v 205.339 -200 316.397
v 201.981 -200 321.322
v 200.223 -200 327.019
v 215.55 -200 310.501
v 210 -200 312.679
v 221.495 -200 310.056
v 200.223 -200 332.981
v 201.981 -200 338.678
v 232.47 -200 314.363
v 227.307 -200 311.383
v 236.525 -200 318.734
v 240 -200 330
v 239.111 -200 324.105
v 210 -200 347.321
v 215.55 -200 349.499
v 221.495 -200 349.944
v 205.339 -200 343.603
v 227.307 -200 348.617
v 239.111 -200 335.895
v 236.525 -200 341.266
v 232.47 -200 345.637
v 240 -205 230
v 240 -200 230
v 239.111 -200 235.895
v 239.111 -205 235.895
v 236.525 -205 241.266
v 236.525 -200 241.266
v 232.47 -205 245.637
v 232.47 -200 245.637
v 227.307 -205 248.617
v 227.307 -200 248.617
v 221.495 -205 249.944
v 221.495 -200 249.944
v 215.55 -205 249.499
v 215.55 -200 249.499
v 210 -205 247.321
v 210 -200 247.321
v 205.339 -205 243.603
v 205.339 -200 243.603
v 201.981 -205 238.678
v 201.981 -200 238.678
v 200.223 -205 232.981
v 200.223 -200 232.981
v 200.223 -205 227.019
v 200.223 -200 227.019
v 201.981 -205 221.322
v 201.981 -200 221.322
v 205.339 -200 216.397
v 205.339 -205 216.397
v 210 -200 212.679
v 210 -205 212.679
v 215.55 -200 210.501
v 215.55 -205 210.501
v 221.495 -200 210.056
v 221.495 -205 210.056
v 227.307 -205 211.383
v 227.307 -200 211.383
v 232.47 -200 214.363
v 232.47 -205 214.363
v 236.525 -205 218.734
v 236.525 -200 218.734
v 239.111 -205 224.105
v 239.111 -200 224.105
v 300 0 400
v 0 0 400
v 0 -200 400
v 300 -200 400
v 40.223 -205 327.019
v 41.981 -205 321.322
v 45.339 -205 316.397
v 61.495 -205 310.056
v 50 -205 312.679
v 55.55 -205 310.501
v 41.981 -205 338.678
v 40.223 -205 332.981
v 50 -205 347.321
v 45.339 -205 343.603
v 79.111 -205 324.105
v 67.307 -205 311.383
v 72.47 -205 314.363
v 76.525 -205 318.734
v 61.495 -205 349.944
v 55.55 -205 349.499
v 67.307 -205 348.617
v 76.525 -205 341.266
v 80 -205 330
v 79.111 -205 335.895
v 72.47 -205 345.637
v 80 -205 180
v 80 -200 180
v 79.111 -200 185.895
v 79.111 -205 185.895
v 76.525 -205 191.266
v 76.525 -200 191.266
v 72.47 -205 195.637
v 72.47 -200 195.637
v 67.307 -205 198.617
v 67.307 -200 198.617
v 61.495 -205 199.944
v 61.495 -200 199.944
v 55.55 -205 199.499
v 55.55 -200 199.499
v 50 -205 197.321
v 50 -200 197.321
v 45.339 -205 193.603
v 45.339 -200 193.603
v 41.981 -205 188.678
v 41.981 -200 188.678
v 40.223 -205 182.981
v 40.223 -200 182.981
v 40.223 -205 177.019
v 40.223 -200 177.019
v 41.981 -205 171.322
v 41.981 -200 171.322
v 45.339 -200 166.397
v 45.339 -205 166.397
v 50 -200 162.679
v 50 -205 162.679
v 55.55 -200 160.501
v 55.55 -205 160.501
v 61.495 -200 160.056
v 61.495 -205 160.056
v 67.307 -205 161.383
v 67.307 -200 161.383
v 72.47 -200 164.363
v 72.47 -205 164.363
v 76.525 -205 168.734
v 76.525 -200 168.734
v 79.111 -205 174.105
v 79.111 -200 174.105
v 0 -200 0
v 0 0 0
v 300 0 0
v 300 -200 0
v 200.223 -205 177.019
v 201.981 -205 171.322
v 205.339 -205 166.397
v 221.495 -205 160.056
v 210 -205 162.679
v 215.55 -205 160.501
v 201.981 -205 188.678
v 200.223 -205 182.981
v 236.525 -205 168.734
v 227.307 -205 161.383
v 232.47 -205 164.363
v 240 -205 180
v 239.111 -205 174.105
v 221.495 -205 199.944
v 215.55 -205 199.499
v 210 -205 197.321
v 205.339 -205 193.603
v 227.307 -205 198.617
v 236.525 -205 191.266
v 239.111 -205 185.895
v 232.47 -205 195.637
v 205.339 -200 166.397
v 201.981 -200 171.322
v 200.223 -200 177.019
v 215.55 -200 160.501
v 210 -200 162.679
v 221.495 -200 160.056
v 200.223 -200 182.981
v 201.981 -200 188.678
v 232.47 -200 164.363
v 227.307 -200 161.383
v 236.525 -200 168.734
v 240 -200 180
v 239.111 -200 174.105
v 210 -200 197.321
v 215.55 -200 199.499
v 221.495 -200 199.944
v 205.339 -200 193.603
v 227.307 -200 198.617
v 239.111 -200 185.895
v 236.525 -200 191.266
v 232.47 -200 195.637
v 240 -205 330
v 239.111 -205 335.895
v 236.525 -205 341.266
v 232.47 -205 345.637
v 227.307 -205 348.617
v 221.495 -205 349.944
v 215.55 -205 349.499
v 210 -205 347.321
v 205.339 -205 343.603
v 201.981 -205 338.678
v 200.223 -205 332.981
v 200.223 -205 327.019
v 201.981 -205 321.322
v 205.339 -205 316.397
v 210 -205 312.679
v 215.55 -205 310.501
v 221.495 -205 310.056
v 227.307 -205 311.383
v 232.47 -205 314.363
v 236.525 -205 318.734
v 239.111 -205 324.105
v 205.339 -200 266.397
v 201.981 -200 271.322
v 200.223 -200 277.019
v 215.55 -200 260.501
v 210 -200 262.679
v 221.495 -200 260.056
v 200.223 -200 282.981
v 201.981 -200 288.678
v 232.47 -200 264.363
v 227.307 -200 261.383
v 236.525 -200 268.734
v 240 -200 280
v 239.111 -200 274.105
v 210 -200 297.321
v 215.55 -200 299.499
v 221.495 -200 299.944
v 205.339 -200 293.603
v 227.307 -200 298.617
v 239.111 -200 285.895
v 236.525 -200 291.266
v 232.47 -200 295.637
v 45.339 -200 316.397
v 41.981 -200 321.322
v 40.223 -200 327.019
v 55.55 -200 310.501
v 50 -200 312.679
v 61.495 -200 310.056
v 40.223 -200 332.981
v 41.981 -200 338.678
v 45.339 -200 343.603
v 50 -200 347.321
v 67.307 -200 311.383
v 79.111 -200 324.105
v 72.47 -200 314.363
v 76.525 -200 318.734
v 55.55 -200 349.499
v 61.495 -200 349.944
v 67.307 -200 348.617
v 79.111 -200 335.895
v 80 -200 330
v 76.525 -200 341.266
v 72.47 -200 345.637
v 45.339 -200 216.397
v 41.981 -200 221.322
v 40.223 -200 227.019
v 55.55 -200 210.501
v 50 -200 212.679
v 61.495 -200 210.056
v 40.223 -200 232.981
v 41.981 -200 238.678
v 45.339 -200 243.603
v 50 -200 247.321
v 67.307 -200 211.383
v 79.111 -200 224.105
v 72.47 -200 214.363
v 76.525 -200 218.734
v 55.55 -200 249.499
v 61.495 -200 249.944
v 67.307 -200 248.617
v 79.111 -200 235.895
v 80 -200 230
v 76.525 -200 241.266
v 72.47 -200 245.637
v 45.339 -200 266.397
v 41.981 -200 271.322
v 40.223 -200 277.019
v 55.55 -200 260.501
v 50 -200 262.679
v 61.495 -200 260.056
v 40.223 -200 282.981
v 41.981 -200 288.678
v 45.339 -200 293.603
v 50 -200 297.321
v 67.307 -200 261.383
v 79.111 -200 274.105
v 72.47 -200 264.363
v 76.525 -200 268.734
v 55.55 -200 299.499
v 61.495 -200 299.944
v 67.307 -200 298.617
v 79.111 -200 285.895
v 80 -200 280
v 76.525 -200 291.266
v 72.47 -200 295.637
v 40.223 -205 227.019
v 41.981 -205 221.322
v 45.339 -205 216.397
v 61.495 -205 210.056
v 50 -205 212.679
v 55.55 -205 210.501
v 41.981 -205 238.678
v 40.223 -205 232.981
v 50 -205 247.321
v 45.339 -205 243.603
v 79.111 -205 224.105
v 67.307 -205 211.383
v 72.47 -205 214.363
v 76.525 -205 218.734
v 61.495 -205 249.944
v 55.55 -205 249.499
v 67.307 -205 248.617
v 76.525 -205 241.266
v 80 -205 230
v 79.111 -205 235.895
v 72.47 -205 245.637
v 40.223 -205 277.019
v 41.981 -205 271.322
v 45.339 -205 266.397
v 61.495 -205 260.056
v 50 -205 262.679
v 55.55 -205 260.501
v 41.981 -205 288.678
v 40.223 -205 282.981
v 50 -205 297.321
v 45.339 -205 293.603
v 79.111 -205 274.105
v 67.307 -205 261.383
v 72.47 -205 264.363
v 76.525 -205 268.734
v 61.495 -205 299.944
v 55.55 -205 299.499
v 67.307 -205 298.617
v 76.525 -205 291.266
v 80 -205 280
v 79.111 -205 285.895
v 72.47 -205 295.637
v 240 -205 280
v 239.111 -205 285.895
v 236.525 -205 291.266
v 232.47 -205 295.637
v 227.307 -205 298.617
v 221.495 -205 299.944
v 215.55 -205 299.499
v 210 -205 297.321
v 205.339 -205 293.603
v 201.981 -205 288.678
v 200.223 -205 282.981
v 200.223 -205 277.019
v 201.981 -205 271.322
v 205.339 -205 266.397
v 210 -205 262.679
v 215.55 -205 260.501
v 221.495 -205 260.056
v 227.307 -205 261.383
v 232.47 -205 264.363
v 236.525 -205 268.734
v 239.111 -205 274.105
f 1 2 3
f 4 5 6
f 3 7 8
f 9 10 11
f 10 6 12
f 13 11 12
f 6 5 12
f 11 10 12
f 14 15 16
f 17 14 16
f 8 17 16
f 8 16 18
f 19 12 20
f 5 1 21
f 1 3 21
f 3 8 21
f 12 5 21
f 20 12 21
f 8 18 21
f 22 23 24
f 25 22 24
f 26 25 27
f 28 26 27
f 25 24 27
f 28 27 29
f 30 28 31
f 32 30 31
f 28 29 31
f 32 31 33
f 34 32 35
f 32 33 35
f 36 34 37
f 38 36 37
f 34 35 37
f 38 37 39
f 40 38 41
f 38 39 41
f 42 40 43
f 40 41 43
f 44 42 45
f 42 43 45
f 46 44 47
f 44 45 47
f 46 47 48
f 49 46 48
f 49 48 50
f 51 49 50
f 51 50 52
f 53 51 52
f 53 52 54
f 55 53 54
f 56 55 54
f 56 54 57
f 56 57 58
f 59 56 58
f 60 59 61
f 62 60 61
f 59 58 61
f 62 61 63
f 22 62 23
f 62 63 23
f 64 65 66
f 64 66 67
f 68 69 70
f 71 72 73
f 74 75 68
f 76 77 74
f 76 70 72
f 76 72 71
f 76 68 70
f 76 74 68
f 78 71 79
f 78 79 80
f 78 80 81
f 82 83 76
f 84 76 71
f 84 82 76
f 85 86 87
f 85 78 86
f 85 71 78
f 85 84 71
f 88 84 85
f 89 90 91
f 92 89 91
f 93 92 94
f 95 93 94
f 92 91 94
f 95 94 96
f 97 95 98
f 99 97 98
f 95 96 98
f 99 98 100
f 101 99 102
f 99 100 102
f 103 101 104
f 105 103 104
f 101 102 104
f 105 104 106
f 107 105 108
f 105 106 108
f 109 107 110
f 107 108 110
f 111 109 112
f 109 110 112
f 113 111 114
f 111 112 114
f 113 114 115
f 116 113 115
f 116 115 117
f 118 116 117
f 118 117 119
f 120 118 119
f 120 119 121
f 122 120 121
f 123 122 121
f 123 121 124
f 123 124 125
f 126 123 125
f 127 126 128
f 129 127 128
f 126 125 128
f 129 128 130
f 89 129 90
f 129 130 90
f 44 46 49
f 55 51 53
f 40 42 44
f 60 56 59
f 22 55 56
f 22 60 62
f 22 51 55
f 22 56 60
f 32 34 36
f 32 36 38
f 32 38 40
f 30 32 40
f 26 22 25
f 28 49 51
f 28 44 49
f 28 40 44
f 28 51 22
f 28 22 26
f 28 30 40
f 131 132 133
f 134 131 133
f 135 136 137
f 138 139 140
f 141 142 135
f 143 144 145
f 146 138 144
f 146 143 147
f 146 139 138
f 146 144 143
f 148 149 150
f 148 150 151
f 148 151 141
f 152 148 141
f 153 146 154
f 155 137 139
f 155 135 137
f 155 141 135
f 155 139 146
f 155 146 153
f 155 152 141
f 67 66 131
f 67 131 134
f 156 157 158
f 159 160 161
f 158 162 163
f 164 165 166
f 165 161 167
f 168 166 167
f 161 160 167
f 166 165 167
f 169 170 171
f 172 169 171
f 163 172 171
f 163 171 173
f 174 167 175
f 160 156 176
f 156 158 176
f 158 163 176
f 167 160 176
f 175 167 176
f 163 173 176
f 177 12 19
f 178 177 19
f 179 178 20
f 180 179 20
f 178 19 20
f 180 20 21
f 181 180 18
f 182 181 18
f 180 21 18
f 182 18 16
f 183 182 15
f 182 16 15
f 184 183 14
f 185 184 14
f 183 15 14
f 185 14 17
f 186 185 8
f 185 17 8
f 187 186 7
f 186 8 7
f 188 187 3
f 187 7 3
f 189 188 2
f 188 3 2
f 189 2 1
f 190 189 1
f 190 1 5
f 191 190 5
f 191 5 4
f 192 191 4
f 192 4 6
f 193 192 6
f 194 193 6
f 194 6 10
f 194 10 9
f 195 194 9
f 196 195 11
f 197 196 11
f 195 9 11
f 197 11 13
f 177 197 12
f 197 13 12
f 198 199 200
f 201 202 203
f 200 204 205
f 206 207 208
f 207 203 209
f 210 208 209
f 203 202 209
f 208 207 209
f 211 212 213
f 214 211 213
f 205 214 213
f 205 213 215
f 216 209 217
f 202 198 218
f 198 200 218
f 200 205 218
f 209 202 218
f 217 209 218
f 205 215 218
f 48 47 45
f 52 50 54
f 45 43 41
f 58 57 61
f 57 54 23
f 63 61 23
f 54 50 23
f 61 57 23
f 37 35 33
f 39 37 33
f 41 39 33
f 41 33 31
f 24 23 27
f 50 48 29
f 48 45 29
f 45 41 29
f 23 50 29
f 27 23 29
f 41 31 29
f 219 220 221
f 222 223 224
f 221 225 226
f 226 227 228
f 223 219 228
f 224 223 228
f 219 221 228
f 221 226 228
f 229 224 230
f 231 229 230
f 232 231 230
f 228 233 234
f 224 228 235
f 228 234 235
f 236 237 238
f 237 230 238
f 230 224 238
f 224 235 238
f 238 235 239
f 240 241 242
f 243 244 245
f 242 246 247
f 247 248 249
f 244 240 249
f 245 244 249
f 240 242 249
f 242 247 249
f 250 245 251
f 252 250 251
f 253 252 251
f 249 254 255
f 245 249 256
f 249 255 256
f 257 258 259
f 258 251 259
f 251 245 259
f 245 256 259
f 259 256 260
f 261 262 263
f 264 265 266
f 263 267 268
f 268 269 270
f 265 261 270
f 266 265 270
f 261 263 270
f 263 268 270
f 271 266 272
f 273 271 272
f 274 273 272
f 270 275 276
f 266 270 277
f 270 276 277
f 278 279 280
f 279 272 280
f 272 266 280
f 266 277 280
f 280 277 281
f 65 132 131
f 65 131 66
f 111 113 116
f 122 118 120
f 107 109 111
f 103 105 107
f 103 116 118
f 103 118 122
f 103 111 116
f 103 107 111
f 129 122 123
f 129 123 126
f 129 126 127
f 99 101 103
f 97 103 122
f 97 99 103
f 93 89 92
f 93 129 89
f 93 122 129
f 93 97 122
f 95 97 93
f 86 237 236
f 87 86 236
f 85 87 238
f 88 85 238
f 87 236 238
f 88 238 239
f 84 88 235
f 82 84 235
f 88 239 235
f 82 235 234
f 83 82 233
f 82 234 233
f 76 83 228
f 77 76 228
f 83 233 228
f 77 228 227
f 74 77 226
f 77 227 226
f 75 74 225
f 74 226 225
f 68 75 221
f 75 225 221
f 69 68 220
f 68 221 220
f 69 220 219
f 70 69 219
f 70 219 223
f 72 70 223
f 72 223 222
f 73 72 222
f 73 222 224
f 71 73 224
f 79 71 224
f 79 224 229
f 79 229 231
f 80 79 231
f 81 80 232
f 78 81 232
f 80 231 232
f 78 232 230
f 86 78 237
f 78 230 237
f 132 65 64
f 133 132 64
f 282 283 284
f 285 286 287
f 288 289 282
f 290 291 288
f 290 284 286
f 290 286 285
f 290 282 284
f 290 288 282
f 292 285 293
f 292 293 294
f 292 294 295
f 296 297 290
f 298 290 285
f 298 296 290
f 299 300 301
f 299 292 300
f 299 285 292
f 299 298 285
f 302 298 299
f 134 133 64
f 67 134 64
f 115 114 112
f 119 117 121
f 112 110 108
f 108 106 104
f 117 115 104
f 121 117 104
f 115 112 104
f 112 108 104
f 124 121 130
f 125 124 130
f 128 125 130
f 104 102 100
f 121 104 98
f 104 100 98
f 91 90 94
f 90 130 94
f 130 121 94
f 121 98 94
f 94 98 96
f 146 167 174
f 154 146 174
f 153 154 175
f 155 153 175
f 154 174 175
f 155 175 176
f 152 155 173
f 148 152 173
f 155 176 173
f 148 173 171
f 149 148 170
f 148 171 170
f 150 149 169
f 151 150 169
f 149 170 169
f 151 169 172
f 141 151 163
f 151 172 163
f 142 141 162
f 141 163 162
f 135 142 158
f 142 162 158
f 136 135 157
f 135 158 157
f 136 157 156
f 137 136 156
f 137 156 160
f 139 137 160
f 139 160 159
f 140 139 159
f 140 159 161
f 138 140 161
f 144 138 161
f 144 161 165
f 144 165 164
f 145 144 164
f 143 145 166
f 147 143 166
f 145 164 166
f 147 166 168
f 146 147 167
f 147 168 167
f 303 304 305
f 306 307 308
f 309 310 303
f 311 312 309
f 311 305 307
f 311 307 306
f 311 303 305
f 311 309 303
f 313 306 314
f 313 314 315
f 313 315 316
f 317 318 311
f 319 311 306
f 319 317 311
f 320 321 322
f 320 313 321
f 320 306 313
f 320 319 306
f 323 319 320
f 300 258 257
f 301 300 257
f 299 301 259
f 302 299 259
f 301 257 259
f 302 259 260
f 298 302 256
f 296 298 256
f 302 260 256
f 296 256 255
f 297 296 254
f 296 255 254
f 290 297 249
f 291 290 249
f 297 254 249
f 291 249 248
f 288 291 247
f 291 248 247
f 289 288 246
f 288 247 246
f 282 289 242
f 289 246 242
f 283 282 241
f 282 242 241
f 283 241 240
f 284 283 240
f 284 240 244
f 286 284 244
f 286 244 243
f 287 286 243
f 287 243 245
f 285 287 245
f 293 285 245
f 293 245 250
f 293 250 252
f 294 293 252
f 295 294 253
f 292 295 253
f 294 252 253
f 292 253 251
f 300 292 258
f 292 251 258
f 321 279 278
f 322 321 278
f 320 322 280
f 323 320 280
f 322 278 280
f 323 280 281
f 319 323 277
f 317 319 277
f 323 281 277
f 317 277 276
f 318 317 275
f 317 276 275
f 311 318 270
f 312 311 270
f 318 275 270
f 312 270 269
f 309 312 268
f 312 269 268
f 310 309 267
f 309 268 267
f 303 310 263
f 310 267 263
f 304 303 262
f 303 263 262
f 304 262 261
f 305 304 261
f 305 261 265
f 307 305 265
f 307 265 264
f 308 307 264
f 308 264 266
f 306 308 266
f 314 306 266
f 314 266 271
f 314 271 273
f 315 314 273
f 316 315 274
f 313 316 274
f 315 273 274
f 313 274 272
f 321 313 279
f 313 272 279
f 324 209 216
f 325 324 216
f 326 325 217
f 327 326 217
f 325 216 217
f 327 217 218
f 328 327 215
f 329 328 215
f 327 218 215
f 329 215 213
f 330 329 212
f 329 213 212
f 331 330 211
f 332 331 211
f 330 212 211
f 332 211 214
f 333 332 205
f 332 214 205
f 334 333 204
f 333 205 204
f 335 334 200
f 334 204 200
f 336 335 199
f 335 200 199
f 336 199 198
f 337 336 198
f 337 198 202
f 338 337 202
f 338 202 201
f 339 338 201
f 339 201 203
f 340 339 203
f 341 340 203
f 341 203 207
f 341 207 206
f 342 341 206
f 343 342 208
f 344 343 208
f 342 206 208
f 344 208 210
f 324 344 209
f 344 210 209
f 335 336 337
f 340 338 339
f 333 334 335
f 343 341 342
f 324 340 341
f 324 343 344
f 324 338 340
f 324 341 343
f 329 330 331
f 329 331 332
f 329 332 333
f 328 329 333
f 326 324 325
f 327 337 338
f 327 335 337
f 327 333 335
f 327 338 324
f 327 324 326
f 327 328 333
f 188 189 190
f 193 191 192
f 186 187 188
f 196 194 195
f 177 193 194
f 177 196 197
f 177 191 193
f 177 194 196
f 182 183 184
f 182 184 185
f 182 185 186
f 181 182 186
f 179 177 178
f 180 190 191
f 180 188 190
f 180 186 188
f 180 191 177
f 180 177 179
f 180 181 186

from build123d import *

# Parameters (mm, degrees)
F0_W     = 300
F0_H     = 400
F1_DEPTH = 200
F2_R     = 20
F3_DEPTH = 5


with BuildPart() as f1:
    # F0 (on Front) → F1 (new body)
    with BuildSketch(Plane.XZ):
        with Locations((150, 200)):
            Rectangle(F0_W, F0_H)
    extrude(amount=F1_DEPTH)


with BuildPart() as f3:
    # F2 (on face) → F3 (new body)
    with BuildSketch(Plane.XZ.offset(200)):
        with Locations((60, 280)):
            Circle(F2_R)
        with Locations((60, 330)):
            Circle(F2_R)
        with Locations((60, 230)):
            Circle(F2_R)
        with Locations((60, 180)):
            Circle(F2_R)
        with Locations((220, 330)):
            Circle(F2_R)
        with Locations((220, 280)):
            Circle(F2_R)
        with Locations((220, 230)):
            Circle(F2_R)
        with Locations((220, 180)):
            Circle(F2_R)
    extrude(amount=F3_DEPTH)


solid = Compound([f1.part, f3.part])
